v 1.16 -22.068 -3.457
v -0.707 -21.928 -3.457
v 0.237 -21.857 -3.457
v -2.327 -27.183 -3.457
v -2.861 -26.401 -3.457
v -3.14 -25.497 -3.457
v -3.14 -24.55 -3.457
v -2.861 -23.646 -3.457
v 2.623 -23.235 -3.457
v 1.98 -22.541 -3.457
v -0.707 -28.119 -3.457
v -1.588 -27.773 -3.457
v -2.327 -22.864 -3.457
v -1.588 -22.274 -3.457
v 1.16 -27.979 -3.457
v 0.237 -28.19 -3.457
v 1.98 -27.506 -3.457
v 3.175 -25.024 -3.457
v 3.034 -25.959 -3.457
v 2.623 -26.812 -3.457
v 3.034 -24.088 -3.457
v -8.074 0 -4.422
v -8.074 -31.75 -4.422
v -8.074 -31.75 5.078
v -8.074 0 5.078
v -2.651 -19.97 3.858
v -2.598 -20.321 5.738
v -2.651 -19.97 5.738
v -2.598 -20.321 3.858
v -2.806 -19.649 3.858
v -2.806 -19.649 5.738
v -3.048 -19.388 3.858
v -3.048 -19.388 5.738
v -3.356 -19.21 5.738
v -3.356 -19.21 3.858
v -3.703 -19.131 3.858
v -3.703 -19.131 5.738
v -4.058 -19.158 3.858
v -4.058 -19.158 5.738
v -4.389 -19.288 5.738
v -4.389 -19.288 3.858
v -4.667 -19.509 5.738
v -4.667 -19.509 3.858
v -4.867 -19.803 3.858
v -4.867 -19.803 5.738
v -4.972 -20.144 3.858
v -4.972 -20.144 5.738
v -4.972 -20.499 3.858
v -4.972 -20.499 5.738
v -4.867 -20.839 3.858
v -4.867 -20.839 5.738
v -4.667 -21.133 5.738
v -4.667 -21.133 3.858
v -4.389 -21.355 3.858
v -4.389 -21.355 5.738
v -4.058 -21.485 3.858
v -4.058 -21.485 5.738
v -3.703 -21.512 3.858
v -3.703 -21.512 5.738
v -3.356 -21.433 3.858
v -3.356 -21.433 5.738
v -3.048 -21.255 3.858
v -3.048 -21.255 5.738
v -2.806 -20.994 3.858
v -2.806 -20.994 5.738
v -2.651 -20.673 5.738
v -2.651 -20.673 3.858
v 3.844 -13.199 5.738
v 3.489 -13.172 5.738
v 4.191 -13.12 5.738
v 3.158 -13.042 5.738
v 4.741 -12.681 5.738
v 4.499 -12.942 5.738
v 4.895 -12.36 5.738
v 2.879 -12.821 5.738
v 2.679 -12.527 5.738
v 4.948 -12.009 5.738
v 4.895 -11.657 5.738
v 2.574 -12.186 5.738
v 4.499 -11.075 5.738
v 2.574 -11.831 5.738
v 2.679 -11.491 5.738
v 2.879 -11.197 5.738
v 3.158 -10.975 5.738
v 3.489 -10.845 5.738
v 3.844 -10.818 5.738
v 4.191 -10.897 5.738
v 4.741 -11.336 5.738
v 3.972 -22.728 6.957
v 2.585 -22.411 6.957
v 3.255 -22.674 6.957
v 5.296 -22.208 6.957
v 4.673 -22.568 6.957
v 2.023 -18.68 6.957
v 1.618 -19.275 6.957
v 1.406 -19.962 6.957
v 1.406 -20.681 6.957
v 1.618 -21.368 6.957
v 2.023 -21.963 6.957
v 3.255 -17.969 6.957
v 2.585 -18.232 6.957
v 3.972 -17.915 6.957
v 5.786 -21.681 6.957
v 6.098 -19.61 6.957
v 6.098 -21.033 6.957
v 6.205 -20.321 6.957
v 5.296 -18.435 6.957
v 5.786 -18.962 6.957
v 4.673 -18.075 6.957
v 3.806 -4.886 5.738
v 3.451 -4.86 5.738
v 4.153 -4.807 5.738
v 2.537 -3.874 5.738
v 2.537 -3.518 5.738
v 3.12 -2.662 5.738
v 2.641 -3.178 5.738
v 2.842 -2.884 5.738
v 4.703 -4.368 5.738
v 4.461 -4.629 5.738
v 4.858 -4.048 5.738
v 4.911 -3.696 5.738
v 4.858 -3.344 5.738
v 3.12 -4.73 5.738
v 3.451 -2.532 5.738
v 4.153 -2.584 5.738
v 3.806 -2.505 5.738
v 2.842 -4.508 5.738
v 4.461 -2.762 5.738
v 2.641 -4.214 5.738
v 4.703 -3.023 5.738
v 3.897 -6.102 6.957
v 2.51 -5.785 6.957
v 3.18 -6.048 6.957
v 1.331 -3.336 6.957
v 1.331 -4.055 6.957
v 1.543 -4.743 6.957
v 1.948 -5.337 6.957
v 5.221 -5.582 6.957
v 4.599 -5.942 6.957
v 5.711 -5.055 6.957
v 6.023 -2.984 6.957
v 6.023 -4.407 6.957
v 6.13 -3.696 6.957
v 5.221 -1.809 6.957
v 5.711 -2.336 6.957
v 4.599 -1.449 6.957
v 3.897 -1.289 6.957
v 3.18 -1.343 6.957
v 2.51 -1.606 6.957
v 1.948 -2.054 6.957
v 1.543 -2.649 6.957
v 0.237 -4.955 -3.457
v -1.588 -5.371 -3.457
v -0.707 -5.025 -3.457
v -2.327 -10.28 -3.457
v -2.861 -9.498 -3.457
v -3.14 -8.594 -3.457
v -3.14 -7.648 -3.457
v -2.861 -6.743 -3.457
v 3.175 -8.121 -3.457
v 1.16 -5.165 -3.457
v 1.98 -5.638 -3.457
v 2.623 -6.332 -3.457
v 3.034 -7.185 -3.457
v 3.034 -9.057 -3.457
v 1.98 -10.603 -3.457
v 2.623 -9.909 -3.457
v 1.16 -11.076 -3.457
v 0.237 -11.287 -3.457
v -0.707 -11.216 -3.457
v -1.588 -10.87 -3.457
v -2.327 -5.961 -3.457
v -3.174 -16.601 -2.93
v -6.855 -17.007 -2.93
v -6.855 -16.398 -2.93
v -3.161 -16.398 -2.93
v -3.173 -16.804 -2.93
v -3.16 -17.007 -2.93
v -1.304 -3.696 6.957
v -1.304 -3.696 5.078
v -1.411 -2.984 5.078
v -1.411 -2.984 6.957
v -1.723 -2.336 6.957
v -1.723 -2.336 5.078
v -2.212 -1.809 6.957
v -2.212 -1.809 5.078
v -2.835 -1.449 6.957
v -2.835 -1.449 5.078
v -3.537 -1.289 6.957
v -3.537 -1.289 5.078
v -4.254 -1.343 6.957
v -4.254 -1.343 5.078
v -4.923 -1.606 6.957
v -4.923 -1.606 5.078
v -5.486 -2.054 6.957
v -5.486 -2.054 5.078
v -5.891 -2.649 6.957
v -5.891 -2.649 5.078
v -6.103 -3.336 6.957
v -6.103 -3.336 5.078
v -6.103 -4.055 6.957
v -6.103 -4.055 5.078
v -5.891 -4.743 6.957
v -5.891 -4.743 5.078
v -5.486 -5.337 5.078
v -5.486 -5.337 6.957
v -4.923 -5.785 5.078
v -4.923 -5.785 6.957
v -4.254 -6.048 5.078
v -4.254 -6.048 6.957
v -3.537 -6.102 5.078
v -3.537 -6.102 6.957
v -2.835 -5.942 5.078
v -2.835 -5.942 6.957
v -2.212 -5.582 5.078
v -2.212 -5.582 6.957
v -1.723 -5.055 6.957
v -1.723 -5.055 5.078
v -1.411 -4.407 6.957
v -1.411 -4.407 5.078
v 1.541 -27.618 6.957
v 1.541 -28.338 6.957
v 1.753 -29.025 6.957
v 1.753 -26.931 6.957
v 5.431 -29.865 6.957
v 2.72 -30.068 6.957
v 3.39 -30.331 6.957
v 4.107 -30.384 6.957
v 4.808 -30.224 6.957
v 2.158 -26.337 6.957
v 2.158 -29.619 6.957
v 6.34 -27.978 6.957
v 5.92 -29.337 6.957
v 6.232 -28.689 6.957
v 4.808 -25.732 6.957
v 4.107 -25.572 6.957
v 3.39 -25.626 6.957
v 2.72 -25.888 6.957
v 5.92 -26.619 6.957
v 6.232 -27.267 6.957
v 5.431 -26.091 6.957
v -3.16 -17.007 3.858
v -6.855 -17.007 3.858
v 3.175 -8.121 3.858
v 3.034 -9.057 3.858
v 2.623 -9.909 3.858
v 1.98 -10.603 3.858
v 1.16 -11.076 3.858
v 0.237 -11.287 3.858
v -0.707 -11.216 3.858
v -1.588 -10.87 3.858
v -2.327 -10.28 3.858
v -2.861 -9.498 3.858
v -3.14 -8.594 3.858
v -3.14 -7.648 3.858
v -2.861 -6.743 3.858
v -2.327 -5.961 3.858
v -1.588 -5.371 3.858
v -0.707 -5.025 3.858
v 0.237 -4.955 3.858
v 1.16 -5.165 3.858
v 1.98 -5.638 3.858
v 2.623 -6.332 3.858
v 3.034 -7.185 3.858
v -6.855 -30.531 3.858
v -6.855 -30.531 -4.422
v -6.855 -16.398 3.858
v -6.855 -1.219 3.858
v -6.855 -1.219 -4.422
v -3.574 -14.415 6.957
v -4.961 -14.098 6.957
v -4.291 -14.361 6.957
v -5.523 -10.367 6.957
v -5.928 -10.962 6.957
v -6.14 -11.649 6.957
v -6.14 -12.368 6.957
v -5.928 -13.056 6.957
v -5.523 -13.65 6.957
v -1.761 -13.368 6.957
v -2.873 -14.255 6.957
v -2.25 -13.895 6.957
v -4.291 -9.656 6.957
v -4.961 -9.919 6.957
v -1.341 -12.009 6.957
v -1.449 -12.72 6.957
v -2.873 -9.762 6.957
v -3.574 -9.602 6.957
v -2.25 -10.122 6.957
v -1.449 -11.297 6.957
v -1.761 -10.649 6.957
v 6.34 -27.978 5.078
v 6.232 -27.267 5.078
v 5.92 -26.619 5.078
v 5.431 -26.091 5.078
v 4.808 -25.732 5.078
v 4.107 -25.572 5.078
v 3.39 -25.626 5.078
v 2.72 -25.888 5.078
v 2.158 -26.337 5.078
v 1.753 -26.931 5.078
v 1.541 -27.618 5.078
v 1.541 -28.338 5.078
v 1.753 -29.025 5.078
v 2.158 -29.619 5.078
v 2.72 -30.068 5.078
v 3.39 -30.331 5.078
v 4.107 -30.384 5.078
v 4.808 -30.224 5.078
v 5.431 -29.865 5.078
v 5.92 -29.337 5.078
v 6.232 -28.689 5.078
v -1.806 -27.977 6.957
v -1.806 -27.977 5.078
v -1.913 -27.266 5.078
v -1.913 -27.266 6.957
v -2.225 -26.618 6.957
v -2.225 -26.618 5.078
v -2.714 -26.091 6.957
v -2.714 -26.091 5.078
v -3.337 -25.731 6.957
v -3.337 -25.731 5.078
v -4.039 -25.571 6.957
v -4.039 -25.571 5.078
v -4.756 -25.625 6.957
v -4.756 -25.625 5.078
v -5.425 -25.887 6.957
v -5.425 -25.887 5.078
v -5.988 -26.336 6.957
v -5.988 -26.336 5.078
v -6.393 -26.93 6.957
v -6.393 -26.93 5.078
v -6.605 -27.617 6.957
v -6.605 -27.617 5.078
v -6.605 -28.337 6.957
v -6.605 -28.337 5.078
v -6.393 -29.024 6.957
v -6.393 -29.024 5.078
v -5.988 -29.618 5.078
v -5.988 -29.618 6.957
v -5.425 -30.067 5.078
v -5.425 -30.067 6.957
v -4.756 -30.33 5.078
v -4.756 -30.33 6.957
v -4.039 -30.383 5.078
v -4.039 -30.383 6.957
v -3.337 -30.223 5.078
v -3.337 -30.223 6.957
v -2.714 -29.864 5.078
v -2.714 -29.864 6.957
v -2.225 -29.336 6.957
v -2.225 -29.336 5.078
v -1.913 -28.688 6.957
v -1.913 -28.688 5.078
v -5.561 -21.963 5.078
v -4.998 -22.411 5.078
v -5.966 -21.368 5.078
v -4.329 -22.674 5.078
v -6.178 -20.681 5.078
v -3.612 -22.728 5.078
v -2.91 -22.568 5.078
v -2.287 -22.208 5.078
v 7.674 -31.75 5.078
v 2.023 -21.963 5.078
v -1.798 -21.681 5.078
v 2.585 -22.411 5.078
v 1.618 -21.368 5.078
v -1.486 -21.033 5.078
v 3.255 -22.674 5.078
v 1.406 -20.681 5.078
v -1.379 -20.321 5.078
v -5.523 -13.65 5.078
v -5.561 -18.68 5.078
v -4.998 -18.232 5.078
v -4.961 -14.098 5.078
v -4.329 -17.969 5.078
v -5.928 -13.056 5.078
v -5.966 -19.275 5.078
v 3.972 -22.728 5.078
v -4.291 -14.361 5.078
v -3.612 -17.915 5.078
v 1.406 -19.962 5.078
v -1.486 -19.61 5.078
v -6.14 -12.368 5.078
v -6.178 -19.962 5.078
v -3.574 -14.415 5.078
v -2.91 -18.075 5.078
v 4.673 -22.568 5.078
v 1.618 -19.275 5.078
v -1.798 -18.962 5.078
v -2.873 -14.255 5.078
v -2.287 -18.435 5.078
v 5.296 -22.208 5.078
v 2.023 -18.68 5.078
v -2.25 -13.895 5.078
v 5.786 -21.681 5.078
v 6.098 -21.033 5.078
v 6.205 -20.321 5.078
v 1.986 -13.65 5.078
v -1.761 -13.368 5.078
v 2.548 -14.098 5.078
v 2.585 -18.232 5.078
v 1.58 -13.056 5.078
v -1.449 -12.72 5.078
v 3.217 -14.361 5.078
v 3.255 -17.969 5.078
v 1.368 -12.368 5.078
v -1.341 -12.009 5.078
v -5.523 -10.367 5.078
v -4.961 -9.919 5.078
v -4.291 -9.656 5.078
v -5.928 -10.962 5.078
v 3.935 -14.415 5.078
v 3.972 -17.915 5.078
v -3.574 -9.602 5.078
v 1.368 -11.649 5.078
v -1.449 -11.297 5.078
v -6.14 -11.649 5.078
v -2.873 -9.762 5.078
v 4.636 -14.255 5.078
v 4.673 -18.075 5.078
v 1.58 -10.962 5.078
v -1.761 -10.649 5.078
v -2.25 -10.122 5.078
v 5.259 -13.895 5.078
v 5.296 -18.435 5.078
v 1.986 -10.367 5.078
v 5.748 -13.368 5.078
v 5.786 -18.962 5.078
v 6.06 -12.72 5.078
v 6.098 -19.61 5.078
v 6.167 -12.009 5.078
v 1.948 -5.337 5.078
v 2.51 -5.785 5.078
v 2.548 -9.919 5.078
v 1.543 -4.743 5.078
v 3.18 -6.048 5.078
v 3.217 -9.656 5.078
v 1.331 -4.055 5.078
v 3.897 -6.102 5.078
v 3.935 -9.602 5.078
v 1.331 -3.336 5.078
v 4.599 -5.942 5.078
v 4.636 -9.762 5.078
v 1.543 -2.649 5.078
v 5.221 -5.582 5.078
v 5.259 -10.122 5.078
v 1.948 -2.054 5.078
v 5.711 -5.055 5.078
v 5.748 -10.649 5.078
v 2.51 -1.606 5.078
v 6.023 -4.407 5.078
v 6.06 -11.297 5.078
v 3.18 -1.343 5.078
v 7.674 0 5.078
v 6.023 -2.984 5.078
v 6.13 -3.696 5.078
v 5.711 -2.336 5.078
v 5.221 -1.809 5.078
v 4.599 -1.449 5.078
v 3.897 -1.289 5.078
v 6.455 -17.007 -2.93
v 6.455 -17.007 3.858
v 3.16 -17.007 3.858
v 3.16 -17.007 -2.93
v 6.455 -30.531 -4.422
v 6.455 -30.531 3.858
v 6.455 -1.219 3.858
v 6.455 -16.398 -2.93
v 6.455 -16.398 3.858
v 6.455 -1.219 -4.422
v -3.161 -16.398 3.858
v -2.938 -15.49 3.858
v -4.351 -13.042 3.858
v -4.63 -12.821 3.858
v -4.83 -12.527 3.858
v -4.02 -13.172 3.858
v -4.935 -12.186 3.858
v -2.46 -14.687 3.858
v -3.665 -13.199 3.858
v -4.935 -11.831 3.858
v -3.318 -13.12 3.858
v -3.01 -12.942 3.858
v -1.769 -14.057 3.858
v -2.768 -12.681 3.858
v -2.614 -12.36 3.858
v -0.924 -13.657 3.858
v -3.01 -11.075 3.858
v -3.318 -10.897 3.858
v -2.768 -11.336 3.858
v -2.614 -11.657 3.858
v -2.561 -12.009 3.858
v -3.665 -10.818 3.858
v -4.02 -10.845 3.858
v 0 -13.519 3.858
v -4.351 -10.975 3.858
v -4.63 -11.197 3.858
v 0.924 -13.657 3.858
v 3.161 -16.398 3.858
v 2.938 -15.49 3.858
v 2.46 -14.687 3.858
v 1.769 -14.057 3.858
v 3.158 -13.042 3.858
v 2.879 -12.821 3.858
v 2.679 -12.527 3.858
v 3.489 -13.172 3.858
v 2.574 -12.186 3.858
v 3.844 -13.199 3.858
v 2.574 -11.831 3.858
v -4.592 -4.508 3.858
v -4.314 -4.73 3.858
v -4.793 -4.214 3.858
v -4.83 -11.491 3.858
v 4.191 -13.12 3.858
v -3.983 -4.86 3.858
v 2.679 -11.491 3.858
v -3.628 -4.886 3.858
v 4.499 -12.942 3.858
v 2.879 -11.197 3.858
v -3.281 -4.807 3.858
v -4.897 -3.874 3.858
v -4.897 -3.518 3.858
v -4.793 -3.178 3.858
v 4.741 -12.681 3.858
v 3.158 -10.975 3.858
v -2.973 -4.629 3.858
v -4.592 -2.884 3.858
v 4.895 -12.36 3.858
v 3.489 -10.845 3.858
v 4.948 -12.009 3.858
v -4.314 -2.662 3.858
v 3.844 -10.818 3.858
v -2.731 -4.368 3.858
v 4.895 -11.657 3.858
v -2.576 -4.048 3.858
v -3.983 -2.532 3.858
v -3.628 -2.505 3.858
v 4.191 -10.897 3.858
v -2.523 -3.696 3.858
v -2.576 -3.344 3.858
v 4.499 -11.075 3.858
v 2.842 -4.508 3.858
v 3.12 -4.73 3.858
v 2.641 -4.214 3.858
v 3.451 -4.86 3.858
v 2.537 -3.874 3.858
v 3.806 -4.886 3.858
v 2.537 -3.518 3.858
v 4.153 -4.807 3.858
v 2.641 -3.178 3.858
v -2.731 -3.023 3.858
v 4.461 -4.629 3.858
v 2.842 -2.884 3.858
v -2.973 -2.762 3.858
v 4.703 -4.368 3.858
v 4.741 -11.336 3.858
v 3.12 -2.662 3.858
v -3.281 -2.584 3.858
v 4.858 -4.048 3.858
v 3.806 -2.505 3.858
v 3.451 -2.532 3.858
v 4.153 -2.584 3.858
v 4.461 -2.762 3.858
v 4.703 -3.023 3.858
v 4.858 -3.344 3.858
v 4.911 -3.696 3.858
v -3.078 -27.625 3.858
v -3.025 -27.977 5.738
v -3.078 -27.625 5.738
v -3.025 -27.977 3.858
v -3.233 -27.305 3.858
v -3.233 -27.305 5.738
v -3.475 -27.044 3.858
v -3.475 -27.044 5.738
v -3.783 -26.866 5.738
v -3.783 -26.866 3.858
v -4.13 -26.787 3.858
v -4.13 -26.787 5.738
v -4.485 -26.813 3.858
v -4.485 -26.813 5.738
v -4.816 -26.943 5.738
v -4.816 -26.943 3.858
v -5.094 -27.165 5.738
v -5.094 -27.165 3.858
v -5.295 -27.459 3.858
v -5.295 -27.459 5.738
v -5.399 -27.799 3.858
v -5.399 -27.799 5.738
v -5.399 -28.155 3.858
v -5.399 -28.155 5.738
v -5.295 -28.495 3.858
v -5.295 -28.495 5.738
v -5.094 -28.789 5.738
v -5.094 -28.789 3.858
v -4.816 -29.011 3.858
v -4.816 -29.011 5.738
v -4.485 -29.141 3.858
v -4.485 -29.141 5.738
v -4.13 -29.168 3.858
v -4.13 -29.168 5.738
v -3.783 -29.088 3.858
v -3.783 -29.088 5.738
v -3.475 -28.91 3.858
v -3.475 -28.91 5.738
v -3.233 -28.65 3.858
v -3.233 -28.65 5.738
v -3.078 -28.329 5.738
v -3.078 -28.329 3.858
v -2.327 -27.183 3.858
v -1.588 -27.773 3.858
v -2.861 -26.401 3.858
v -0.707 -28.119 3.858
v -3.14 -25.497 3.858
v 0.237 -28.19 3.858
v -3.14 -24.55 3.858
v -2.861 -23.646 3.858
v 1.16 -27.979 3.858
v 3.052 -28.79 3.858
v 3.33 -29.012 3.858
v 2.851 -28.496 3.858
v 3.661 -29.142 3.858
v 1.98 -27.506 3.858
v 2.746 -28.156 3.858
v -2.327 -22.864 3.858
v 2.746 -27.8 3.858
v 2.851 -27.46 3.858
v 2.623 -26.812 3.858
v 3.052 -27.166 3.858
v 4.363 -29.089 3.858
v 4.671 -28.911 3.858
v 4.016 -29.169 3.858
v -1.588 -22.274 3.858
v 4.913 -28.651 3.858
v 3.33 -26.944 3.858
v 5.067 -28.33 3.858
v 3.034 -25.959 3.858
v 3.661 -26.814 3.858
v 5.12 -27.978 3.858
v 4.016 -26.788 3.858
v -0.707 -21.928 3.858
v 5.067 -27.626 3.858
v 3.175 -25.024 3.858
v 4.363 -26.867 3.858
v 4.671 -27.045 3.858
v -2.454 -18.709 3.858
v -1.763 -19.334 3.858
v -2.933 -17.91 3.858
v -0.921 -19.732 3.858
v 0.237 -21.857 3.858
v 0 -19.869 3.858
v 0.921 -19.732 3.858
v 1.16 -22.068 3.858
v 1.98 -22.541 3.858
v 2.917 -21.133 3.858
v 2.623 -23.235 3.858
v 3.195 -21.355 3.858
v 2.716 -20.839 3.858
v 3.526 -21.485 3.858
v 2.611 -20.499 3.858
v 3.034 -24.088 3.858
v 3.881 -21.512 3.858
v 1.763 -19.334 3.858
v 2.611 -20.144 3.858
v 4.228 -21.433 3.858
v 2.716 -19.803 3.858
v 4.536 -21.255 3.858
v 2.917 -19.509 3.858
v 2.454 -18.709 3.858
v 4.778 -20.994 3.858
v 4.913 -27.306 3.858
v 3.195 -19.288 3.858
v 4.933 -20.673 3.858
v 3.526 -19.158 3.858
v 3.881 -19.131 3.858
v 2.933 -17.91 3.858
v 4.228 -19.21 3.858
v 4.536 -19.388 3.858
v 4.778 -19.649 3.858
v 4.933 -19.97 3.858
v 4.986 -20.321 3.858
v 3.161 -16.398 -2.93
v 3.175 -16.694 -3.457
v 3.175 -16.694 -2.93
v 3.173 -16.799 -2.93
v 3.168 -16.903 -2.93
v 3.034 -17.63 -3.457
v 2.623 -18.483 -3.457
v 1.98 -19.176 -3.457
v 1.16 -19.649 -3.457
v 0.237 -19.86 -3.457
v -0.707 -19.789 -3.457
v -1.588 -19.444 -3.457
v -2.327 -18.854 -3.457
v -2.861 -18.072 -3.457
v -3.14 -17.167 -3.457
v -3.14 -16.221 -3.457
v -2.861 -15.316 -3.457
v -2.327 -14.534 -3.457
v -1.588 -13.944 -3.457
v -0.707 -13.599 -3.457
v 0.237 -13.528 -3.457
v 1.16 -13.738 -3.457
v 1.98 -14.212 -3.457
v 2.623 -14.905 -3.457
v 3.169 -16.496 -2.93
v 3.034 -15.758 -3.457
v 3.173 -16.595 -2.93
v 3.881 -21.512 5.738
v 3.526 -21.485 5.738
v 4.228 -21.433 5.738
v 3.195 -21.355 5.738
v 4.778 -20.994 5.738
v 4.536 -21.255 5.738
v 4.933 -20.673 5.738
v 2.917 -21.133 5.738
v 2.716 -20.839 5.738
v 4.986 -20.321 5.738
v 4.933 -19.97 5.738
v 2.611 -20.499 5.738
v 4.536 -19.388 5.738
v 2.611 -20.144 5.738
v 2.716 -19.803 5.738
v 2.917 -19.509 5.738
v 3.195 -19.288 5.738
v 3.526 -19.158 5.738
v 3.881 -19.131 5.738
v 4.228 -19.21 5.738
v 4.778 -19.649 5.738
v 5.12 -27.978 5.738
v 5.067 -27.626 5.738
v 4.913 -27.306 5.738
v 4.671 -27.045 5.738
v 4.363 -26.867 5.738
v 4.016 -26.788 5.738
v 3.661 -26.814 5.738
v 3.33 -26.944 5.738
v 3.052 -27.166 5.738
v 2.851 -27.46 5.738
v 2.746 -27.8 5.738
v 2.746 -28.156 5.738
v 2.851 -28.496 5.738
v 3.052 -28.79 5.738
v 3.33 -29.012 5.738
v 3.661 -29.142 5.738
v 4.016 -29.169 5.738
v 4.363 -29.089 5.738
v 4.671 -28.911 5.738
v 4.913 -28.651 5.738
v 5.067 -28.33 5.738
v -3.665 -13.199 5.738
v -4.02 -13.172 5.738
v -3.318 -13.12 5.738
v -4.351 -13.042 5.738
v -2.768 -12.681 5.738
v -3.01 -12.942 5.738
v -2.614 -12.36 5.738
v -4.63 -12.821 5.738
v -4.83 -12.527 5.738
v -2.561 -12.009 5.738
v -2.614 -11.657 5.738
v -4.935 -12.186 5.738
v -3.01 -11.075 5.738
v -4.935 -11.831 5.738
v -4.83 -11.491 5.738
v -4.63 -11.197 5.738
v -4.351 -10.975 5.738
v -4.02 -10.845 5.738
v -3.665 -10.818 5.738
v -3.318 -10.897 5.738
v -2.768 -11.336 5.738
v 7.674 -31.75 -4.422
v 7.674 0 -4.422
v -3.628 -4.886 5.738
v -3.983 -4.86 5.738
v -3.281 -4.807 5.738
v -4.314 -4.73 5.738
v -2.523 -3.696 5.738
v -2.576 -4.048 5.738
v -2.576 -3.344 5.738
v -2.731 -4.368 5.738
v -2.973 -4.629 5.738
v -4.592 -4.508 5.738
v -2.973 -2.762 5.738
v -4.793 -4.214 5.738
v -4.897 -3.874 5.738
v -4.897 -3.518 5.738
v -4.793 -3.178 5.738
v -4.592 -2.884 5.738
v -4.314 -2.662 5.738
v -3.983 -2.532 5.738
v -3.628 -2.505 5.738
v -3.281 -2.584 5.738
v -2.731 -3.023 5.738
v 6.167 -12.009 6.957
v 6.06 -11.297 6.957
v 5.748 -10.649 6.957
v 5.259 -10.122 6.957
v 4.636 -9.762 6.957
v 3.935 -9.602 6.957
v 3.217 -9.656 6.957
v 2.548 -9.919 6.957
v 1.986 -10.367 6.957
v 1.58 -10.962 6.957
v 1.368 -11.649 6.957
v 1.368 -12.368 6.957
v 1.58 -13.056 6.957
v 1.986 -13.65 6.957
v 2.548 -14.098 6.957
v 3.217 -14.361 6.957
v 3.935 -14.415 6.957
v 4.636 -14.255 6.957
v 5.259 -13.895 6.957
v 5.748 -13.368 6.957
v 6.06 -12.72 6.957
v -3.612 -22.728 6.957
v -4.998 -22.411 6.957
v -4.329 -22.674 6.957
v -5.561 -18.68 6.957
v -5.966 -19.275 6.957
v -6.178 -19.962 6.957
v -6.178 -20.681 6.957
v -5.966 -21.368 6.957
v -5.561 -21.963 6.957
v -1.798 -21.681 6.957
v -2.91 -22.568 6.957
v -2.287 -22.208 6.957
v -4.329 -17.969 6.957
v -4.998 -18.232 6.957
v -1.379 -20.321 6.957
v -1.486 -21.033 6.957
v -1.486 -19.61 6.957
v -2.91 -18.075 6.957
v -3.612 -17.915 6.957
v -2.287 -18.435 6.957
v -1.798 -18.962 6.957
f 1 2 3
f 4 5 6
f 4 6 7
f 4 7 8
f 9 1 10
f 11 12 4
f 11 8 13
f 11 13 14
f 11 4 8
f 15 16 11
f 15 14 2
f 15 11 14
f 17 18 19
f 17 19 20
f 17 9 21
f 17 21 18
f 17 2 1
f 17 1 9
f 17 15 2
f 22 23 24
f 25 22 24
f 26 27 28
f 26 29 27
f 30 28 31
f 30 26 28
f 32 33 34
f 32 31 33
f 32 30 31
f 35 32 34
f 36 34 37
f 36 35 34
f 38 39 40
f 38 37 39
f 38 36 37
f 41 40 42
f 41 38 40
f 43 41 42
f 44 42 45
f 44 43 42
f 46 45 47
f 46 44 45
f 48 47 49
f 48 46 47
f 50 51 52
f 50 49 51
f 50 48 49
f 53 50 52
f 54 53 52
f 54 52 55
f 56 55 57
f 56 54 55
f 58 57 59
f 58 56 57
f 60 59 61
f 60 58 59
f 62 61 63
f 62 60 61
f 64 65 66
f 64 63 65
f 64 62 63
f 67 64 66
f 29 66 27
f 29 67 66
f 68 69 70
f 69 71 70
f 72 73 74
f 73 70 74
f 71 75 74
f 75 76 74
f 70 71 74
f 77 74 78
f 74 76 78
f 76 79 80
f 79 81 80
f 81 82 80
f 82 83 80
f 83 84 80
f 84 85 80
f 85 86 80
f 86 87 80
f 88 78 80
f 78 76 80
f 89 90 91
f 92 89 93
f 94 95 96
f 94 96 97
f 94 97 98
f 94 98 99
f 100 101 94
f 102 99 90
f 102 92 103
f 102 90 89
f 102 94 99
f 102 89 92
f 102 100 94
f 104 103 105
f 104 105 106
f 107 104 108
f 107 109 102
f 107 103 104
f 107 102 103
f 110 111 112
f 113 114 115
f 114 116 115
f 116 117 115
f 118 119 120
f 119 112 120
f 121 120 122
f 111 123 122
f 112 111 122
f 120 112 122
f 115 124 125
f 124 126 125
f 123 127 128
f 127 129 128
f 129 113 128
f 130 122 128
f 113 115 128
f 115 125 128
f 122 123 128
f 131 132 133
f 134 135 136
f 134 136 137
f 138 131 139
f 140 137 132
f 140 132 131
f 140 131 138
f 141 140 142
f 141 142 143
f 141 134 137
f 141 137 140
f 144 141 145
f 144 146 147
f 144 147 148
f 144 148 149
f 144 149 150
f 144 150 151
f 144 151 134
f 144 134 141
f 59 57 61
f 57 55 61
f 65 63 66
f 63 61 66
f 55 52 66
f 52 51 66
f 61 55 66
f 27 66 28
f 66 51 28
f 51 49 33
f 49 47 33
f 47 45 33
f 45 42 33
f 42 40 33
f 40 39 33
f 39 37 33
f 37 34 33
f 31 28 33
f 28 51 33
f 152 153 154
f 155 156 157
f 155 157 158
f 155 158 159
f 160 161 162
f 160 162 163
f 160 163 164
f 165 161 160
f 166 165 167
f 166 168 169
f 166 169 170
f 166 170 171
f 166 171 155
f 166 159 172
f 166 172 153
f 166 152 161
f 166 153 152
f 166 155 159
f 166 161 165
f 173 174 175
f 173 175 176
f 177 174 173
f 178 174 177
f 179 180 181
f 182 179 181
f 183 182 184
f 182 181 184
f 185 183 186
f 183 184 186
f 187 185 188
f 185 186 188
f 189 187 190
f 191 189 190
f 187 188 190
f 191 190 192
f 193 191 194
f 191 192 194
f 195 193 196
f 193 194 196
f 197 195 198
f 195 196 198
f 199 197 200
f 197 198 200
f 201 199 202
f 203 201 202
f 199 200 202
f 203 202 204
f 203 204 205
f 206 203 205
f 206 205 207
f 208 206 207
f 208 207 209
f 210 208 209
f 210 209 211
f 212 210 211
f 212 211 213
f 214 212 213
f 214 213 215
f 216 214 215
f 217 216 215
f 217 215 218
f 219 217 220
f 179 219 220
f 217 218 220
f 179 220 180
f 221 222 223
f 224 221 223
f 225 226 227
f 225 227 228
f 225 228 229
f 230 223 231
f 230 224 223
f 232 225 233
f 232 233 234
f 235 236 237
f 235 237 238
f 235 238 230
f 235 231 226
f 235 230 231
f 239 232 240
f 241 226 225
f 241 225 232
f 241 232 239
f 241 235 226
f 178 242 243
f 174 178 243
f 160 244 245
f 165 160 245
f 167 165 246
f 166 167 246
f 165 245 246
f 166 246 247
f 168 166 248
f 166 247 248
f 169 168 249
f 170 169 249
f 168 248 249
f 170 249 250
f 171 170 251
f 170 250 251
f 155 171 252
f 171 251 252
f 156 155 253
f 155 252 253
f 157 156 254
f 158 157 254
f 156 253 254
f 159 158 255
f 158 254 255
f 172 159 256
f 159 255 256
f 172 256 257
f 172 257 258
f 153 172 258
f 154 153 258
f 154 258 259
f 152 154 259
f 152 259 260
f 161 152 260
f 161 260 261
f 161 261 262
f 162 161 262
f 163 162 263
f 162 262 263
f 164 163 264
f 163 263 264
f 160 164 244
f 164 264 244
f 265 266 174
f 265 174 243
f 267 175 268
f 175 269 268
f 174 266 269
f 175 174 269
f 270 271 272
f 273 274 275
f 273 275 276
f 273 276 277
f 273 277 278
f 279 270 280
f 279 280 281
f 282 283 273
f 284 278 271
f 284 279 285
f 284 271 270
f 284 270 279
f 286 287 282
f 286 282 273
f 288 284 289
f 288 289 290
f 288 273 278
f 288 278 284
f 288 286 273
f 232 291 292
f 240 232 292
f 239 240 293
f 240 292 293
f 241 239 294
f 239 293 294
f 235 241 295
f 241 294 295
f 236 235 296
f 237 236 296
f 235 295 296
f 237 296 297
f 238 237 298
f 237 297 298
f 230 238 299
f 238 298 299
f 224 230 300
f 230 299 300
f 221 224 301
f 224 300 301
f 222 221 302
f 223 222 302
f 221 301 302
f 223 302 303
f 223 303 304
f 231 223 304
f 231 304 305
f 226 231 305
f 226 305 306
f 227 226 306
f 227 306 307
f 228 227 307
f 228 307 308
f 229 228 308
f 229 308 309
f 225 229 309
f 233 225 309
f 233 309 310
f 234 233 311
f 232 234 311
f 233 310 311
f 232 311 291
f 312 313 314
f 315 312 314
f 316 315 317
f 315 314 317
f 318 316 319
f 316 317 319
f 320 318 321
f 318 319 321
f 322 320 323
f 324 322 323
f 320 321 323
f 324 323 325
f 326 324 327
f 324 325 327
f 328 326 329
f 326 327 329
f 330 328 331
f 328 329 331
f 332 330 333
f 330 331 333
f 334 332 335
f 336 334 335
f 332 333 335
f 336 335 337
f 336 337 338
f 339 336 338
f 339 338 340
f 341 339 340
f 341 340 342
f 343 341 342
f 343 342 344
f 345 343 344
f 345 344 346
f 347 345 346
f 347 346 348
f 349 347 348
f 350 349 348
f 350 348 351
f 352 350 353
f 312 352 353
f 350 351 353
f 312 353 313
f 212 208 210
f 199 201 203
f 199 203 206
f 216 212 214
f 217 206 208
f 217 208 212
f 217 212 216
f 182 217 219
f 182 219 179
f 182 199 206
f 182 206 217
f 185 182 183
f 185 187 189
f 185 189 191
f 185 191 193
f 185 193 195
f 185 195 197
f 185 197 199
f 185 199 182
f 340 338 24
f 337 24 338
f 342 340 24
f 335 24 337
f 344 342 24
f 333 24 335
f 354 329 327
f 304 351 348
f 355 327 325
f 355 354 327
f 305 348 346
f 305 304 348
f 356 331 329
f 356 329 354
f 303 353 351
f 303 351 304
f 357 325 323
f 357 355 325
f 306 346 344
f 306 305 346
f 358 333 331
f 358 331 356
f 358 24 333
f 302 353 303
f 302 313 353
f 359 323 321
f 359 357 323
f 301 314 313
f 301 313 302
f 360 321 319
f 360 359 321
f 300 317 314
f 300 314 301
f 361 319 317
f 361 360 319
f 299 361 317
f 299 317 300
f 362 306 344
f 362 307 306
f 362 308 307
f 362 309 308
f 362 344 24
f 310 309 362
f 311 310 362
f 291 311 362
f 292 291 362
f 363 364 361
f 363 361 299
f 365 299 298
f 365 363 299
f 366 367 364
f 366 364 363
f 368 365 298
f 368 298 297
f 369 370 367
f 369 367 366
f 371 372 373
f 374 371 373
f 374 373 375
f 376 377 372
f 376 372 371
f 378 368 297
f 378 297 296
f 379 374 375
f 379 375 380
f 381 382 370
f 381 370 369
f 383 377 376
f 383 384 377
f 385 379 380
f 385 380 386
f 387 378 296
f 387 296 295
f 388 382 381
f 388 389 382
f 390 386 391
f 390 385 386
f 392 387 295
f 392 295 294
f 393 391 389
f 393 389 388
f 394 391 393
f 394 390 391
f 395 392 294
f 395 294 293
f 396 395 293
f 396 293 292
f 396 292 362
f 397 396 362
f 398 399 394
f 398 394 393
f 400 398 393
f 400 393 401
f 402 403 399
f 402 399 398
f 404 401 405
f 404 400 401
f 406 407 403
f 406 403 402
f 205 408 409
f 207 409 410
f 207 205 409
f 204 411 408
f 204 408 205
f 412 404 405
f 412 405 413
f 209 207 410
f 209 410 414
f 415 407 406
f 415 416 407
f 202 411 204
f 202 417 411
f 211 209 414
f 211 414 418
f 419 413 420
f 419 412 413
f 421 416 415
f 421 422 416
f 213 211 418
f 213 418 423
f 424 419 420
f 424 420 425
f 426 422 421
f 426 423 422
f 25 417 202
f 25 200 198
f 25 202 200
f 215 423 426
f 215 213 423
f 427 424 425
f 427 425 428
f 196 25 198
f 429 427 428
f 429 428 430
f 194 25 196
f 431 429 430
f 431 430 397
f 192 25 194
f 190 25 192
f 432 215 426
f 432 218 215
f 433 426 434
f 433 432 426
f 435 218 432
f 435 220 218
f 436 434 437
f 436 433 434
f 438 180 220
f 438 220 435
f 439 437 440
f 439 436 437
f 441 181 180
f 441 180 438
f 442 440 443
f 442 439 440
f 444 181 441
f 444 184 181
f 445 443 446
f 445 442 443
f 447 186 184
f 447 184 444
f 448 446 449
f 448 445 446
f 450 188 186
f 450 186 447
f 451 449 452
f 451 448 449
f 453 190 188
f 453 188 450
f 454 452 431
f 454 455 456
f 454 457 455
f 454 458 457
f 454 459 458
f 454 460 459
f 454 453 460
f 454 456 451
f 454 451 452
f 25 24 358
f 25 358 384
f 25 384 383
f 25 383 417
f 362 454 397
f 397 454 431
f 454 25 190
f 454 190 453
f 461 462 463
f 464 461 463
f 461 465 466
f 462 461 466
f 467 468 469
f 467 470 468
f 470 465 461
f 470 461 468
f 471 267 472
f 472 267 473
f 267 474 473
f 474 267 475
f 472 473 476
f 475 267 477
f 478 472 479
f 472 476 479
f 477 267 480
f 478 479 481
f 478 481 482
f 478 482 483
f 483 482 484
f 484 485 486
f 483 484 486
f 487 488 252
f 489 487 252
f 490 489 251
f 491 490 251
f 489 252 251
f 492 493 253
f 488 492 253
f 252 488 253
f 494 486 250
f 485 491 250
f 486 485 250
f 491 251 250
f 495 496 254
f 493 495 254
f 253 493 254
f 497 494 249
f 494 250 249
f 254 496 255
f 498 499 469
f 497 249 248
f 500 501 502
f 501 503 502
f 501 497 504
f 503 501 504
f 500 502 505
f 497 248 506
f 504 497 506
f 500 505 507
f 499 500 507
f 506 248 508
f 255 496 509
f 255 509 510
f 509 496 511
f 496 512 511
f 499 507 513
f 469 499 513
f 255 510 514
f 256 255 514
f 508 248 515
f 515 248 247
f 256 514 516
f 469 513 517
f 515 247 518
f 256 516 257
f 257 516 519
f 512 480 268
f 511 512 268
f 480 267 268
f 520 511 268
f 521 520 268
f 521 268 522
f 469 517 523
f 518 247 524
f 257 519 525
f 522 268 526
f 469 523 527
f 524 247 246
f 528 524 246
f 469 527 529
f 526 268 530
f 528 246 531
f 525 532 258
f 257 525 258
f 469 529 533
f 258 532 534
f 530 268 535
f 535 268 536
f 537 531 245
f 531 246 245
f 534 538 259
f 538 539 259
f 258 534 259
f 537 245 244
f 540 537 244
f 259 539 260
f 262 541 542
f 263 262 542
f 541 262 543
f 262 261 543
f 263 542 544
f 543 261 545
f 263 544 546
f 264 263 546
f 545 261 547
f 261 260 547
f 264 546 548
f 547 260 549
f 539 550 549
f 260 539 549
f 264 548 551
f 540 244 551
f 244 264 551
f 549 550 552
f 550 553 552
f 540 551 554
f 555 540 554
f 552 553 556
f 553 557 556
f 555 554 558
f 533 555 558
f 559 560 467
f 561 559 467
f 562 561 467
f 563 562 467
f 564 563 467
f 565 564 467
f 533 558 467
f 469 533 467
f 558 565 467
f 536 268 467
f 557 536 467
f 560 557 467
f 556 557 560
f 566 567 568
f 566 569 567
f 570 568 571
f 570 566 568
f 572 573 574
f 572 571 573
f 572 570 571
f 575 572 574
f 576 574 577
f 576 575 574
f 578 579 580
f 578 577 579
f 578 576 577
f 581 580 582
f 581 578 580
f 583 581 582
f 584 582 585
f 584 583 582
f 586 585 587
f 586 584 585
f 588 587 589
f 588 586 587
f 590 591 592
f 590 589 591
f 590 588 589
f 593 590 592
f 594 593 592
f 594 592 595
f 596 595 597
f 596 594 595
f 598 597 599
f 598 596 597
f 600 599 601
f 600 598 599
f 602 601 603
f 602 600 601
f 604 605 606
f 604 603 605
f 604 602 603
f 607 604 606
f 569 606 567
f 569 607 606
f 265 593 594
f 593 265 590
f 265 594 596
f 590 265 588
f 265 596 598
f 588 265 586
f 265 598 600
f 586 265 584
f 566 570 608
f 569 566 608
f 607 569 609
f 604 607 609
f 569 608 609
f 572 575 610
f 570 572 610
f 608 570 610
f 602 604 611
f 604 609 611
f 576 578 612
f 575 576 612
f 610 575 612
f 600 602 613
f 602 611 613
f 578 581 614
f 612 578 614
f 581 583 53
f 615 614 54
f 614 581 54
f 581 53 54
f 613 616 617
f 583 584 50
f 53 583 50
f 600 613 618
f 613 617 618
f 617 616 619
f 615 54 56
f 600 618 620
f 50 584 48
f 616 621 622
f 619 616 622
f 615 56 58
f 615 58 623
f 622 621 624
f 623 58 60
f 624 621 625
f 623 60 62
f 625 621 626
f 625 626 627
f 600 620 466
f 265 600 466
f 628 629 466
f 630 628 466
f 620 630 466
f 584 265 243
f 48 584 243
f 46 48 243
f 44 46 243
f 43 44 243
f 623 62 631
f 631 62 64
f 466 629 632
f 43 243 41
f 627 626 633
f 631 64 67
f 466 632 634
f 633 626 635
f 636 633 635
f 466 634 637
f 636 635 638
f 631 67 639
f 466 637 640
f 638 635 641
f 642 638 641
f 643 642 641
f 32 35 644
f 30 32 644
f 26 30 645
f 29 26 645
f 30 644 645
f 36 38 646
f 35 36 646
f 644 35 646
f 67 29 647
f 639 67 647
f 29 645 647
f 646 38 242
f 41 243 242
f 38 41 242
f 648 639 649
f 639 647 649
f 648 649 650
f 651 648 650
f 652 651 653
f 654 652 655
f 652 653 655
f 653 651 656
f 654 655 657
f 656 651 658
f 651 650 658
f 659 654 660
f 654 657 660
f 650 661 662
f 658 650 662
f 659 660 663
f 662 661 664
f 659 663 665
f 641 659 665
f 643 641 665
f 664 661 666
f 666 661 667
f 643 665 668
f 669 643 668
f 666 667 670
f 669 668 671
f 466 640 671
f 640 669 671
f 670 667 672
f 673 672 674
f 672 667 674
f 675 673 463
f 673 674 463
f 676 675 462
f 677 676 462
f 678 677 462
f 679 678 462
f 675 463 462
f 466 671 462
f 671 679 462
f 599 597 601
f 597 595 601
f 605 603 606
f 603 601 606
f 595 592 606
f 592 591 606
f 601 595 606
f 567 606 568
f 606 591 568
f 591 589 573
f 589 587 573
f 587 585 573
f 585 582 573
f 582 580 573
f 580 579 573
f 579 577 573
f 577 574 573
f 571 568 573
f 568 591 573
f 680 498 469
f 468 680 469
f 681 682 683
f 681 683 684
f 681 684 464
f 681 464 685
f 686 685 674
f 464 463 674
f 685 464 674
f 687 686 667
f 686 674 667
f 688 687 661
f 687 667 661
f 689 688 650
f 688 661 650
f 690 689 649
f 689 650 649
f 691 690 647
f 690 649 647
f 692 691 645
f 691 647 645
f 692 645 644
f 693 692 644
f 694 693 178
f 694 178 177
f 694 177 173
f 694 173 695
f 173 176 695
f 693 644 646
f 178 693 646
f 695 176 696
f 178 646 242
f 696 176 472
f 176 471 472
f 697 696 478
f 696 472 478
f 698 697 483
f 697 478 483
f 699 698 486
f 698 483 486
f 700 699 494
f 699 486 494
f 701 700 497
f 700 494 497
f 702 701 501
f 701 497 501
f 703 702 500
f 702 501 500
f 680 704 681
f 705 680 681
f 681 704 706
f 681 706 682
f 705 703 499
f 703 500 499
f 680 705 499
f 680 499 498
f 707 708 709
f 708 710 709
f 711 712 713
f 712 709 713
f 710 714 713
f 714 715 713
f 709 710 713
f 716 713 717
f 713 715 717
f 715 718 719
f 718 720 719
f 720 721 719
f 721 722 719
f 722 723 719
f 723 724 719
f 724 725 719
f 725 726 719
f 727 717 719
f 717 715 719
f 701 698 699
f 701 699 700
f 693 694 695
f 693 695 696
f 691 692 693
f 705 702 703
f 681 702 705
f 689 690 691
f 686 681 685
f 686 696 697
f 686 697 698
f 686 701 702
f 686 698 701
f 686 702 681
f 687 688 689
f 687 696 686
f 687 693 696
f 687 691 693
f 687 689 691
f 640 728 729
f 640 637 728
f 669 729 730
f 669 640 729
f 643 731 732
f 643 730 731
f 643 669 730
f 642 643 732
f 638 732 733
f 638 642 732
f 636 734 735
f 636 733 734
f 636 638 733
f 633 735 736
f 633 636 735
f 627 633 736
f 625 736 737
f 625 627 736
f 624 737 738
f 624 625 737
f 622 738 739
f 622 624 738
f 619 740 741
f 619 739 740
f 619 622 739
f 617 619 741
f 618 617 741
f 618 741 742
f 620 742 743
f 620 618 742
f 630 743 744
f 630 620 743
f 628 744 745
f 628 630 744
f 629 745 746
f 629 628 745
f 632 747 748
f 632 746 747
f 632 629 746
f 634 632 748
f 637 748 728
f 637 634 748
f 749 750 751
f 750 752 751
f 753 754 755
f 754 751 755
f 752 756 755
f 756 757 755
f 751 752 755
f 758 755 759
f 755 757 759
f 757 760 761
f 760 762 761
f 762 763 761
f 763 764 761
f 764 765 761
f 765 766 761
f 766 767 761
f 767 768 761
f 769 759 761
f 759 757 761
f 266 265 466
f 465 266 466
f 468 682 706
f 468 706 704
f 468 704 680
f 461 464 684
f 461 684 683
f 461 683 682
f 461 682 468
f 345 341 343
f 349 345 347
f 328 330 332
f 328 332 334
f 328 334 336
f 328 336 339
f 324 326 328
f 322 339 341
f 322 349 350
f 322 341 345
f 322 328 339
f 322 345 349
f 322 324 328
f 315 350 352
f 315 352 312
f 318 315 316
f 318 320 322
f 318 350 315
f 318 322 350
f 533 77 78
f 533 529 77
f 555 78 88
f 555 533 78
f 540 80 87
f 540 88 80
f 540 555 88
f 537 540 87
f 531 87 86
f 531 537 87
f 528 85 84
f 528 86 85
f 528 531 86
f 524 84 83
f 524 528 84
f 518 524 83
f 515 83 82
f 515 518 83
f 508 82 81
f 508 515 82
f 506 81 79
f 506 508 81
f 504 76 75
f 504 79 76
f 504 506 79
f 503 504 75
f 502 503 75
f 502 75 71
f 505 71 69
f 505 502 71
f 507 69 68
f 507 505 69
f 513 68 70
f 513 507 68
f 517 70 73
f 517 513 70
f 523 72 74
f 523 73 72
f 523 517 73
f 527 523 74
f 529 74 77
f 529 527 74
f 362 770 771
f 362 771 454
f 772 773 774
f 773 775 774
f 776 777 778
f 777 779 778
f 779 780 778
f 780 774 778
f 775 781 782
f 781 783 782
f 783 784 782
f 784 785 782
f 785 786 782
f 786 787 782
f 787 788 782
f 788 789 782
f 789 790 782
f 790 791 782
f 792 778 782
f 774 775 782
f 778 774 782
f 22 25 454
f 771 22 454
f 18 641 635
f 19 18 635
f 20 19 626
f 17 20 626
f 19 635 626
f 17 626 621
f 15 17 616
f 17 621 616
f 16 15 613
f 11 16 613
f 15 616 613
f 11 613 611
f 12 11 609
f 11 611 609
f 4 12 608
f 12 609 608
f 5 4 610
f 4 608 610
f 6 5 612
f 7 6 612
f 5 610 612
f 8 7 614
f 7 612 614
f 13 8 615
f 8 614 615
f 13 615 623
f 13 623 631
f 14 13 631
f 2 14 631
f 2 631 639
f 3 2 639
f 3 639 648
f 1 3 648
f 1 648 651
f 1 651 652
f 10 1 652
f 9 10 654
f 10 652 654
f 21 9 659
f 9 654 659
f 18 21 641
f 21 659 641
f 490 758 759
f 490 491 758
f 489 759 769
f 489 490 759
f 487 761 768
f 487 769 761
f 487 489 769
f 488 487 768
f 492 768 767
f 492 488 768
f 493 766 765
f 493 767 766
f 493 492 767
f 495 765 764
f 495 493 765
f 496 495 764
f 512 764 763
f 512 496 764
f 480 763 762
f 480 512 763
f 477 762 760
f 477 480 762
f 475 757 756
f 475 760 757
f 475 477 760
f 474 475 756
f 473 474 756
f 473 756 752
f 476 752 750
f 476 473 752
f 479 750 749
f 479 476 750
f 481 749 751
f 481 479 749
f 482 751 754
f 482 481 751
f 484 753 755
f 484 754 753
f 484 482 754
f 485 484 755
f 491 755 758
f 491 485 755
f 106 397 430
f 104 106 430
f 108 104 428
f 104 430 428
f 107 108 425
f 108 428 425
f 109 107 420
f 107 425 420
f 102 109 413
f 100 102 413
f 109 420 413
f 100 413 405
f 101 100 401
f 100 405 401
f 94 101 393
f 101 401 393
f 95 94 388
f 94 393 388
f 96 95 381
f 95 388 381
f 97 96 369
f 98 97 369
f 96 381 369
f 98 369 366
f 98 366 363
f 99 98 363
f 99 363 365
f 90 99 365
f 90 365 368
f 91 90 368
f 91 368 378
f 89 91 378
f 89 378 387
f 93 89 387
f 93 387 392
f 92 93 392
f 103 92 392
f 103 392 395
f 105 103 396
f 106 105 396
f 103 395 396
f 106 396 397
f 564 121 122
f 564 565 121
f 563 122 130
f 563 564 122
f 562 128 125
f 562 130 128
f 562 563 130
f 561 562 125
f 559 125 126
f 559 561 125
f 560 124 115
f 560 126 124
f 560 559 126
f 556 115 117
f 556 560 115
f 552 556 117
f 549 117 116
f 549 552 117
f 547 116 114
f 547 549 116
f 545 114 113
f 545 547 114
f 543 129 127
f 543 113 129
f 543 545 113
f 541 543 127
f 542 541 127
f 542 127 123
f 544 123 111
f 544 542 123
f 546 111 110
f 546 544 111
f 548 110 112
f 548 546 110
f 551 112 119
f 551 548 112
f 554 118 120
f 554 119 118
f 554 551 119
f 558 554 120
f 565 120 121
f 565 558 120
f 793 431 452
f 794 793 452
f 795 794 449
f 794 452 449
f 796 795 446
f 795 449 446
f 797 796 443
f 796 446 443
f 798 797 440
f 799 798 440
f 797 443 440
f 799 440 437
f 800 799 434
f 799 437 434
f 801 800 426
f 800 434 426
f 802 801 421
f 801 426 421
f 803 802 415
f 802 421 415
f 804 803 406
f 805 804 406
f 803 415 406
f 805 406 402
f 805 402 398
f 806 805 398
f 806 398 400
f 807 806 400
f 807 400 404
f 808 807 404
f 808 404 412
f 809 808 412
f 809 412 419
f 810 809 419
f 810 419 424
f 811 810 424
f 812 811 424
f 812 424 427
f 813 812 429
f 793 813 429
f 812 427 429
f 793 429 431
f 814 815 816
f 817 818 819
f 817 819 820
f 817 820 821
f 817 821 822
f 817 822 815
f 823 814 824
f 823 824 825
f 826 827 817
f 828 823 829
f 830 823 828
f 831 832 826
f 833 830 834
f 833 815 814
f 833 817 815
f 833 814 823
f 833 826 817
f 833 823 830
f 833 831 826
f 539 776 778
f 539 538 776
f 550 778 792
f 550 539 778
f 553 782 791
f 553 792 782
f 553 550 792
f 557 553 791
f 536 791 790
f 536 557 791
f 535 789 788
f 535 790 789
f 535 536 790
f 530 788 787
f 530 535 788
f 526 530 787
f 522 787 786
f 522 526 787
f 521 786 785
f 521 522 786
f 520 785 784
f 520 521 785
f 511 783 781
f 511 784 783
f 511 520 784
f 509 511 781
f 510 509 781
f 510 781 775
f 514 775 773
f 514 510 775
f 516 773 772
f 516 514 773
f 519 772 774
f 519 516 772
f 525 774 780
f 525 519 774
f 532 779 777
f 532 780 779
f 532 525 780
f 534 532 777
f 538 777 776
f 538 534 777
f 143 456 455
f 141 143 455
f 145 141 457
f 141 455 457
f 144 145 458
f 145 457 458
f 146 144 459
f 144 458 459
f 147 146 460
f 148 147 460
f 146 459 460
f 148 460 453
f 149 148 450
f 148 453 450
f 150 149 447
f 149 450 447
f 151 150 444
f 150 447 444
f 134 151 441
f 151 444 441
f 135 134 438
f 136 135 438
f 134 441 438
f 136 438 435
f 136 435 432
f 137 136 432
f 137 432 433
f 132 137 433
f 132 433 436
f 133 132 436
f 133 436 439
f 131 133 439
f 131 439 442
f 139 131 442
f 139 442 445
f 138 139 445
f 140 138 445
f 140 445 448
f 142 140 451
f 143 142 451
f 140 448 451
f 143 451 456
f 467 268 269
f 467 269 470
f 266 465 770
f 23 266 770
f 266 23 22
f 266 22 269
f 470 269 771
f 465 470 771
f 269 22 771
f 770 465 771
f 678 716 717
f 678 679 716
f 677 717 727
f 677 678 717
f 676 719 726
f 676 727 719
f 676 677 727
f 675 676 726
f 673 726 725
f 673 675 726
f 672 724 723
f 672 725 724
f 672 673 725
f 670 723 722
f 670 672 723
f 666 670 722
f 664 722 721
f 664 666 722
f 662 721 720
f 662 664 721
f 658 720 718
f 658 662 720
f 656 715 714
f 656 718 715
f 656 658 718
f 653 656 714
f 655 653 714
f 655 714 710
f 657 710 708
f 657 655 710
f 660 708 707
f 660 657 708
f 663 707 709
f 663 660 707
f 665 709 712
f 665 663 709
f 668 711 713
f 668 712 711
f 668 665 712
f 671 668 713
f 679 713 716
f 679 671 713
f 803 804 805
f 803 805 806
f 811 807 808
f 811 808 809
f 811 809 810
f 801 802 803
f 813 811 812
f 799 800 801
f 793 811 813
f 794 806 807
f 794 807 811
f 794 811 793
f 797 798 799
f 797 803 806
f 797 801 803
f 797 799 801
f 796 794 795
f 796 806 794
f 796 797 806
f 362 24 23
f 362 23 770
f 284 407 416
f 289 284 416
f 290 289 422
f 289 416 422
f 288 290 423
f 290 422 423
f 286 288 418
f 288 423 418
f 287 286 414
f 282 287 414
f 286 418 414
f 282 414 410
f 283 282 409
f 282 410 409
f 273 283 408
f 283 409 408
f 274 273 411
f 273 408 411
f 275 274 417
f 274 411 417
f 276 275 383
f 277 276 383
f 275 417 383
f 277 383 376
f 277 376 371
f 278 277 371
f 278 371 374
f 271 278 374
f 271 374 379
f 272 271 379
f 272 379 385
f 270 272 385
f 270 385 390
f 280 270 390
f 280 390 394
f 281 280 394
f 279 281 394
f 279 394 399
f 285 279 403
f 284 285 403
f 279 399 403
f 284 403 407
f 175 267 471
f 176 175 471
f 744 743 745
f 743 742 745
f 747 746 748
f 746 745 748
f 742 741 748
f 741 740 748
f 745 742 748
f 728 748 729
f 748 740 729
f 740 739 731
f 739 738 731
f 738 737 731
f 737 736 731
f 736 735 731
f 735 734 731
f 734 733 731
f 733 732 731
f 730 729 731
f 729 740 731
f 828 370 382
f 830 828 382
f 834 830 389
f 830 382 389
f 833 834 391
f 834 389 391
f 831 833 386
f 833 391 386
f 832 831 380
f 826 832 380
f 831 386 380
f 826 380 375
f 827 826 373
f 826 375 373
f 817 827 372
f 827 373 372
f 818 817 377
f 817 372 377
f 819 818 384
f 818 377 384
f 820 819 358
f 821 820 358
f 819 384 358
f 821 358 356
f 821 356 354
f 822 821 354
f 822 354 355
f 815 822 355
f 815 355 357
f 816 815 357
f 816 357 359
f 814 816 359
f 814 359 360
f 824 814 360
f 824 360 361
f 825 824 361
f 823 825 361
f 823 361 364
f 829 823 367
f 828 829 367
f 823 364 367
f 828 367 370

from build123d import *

# Parameters (mm, degrees)
F0_W      = 15.748
F0_H      = 9.4996
F1_DEPTH  = 31.75
F2_R      = 2.413
F4_DEPTH  = 1.8796
F3_R      = 2.413
F5_DEPTH  = 1.8796
F6_T      = -1.2192
F7_R      = 3.175
F8_DEPTH  = 7.3152
F9_DEPTH  = 7.3152
F10_DEPTH = 7.3152
F12_DEPTH = 6.7881


with BuildPart() as f1:
    # F0 (on Front) → F1 (new body)
    with BuildSketch(Plane.XZ):
        with Locations((-0.199874863, 0.3277875761)):
            Rectangle(F0_W, F0_H)
    extrude(amount=F1_DEPTH)

    # F2 (on face) → F4 (join)
    with BuildSketch(Plane.XY.offset(5.0775875761)):
        with Locations((-4.2189443147, -27.9770765305)):
            Circle(F2_R)
        with Locations((3.9266556272, -27.978049837)):
            Circle(F2_R)
    extrude(amount=F4_DEPTH)

    # F3 (on face) → F5 (join)
    with BuildSketch(Plane.XY.offset(5.0775875761)):
        with Locations((3.7918896414, -20.3214651638)):
            Circle(F3_R)
        with Locations((3.75443, -12.0085638718)):
            Circle(F3_R)
        with Locations((3.7169703586, -3.6956625797)):
            Circle(F3_R)
        with Locations((-3.7169703586, -3.6956625797)):
            Circle(F3_R)
        with Locations((-3.75443, -12.0085638718)):
            Circle(F3_R)
        with Locations((-3.7918896414, -20.3214651638)):
            Circle(F3_R)
    extrude(amount=F5_DEPTH)

    # F6
    f6_openings = [f1.faces().sort_by_distance(p)[0] for p in [
        (-0.199875, -15.875, -4.422012),
    ]]
    offset(amount=F6_T, openings=f6_openings, kind=Kind.INTERSECTION)

    # F7 (on face) → F8 (join)
    with BuildSketch(Plane(origin=(0, 0, 3.8583875761), x_dir=(1, 0, 0), z_dir=(0, 0, -1))):
        with Locations((0, 8.1207330356)):
            Circle(F7_R)
    extrude(amount=F8_DEPTH)

    # F7 (on face) → F9 (join)
    with BuildSketch(Plane(origin=(0, 0, 3.8583875761), x_dir=(1, 0, 0), z_dir=(0, 0, -1))):
        with Locations((0, 25.0235652365)):
            Circle(F7_R)
    extrude(amount=F9_DEPTH)

    # F7 (on face) → F10 (join)
    with BuildSketch(Plane(origin=(0, 0, 3.8583875761), x_dir=(1, 0, 0), z_dir=(0, 0, -1))):
        with BuildLine():
            ThreePointArc((-3.175, 16.6939621039), (0, 13.5189621039), (3.175, 16.6939621039))
            ThreePointArc((3.175, 16.6939621039), (0, 19.8689621039), (-3.175, 16.6939621039))
        make_face()
    extrude(amount=F10_DEPTH)

    # F11 (on face) → F12 (join)
    with BuildSketch(Plane(origin=(0, 0, 3.8583875761), x_dir=(1, 0, 0), z_dir=(0, 0, -1))):
        with BuildLine():
            ThreePointArc((-3.1611326952, 16.3975416535), (-3.1749888394, 16.7023805357), (-3.1595163506, 17.0071416535))
            Line((-3.1595163506, 17.0071416535), (-6.854674863, 17.0071416535))
            Line((-6.854674863, 17.0071416535), (-6.854674863, 16.3975416535))
            Line((-6.854674863, 16.3975416535), (-3.1611326952, 16.3975416535))
        make_face()
        with BuildLine():
            Line((6.454925137, 17.0071416535), (3.1595163506, 17.0071416535))
            ThreePointArc((3.1595163506, 17.0071416535), (3.1711267251, 16.8507431404), (3.175, 16.6939621039))
            ThreePointArc((3.175, 16.6939621039), (3.171531279, 16.5455897804), (3.1611326952, 16.3975416535))
            Line((3.1611326952, 16.3975416535), (6.454925137, 16.3975416535))
            Line((6.454925137, 16.3975416535), (6.454925137, 17.0071416535))
        make_face()
    extrude(amount=F12_DEPTH)


solid = f1.part
